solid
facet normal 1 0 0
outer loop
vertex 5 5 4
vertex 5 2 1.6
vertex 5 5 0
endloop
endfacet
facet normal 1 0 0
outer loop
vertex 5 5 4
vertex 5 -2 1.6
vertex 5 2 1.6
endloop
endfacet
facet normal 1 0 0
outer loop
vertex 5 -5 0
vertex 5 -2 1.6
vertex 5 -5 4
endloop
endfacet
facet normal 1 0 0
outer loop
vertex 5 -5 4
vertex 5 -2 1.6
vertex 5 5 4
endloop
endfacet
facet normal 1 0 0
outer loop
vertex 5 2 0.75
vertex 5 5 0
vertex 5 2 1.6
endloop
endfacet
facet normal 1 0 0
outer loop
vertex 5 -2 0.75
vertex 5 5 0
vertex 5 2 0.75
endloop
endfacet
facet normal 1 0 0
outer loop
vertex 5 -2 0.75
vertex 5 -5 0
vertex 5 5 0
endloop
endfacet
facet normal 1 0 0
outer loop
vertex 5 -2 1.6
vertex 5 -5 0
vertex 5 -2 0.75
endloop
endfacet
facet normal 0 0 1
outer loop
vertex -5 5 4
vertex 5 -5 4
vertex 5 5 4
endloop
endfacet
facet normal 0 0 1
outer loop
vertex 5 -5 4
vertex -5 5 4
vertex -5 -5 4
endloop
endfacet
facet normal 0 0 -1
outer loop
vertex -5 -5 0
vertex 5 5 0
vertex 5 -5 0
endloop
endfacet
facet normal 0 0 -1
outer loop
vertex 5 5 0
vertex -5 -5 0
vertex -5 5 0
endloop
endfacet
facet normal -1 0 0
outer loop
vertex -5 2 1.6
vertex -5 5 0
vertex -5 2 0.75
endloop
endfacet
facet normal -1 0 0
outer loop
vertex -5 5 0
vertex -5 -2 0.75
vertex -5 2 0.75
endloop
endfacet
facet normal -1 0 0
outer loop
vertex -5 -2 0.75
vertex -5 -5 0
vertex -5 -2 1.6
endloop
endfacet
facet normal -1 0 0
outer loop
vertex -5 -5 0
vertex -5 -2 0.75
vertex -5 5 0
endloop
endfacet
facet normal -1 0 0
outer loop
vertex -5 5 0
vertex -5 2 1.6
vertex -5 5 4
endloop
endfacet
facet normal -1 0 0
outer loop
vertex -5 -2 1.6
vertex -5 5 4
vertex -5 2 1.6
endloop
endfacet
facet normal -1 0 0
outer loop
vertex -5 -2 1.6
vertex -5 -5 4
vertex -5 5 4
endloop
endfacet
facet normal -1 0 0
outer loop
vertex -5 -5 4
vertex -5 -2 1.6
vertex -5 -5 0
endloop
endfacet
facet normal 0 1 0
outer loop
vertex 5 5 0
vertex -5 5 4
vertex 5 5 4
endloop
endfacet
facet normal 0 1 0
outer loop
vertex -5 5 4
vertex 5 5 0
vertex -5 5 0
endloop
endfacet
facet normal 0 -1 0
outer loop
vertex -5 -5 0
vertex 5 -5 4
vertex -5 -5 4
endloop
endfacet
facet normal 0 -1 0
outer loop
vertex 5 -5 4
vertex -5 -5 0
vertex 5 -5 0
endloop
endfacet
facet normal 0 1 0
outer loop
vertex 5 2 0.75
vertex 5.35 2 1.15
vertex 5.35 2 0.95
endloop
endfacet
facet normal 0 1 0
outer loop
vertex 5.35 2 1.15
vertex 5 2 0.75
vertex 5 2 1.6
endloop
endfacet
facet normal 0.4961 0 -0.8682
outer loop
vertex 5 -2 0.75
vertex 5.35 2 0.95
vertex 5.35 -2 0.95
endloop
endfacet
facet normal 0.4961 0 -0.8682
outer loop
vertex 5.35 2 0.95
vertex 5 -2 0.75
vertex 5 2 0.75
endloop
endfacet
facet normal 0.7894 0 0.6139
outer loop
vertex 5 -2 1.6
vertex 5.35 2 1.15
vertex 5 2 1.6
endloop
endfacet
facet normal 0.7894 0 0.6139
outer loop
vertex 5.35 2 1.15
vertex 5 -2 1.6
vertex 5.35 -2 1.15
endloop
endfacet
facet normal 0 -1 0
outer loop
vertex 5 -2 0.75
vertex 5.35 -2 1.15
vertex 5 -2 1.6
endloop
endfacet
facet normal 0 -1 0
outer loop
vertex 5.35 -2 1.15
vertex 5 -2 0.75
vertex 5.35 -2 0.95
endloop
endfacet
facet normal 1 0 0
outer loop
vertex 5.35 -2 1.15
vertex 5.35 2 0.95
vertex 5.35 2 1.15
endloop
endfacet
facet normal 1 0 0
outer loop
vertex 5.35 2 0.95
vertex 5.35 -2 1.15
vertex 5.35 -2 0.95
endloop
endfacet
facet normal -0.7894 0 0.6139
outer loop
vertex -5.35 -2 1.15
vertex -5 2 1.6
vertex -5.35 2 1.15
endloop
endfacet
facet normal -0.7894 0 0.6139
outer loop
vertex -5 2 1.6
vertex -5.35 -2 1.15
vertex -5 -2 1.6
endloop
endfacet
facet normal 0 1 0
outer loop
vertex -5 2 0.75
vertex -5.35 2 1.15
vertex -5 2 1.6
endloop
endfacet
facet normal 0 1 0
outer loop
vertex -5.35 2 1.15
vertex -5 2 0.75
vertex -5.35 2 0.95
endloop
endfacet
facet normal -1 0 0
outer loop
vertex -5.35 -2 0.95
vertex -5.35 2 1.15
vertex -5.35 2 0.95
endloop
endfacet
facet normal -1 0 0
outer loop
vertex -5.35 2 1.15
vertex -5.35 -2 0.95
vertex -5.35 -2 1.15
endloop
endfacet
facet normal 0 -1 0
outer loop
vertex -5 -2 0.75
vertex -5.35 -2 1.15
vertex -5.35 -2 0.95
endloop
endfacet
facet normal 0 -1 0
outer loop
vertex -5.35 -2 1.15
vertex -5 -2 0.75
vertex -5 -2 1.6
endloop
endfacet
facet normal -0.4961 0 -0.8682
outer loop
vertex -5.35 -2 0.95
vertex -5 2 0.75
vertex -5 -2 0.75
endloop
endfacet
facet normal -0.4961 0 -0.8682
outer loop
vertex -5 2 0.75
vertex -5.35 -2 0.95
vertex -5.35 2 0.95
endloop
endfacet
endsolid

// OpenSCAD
// file: ../lib/at01_inverted_core_snap.scad
// File: at01_inverted_core_snap.scad
// AT-01 — experiment-owned inverted fixed-core / removable-shell snap.
//
// This geometry does not copy the QuackWorks/OpenGrid snap. It keeps only the
// high-level design lessons: compact fixed side, removable compliant side,
// explicit locating/retention roles, and a Lite-like 4.0 / 3.4 mm Z baseline.

// Fixed-side baseline.
AT01_CORE_SIZE = 10.0;
AT01_CORE_HEIGHT = 4.0;
AT01_ROOT_SHOULDER = 0.6;
AT01_ENGAGEMENT_HEIGHT = 3.4;

// Removable shell.
AT01_CLEARANCE = 0.20;              // per side on nominal 10 x 10 core
AT01_SHELL_WALL = 1.20;
AT01_SHELL_TOP = 1.20;
AT01_SHELL_INNER = AT01_CORE_SIZE + 2 * AT01_CLEARANCE;
AT01_SHELL_OUTER = AT01_SHELL_INNER + 2 * AT01_SHELL_WALL;
AT01_SHELL_HEIGHT = AT01_ENGAGEMENT_HEIGHT + AT01_SHELL_TOP;

// Two-sided retention on +/-X.
AT01_RIB_PROTRUSION = 0.35;
AT01_RIB_WIDTH = 4.0;
AT01_RIB_Z_BOTTOM = 0.75;
AT01_RIB_Z_LOWER_MAX = 0.95;
AT01_RIB_Z_UPPER_MAX = 1.15;
AT01_RIB_Z_TOP = 1.60;

// Receiving window in each compliant shell tongue.
// Values are shell-local; assembled shell starts at Z=AT01_ROOT_SHOULDER.
AT01_WINDOW_WIDTH = 4.8;
AT01_WINDOW_Z_MIN = 0.05;
AT01_WINDOW_Z_MAX = 1.10;

// Two relief slots isolate the center tongue on each +/-X wall.
AT01_FLEX_SLOT_Y = 3.0;
AT01_FLEX_SLOT_WIDTH = 0.8;

// Evidence helpers.
AT01_EXPLODED_Z = 8.0;
AT01_PROFILE_SLICE = 1.0;

assert(
    abs(AT01_ROOT_SHOULDER + AT01_ENGAGEMENT_HEIGHT - AT01_CORE_HEIGHT) < 0.0001,
    "AT-01 Lite baseline must satisfy shoulder + engagement = 4.0 mm."
);
assert(
    abs(AT01_SHELL_INNER - (AT01_CORE_SIZE + 2 * AT01_CLEARANCE)) < 0.0001,
    "AT-01 shell inner size must preserve the stated side clearance."
);

module _at01_positive_x_retention_rib() {
    // Polygon is defined in X/Z and extruded along Y.
    rotate([90, 0, 0])
        linear_extrude(height = AT01_RIB_WIDTH, center = true, convexity = 10)
            polygon(points = [
                [AT01_CORE_SIZE / 2, AT01_RIB_Z_BOTTOM],
                [AT01_CORE_SIZE / 2 + AT01_RIB_PROTRUSION, AT01_RIB_Z_LOWER_MAX],
                [AT01_CORE_SIZE / 2 + AT01_RIB_PROTRUSION, AT01_RIB_Z_UPPER_MAX],
                [AT01_CORE_SIZE / 2, AT01_RIB_Z_TOP]
            ]);
}

module at01_fixed_core() {
    union() {
        translate([-AT01_CORE_SIZE / 2, -AT01_CORE_SIZE / 2, 0])
            cube([AT01_CORE_SIZE, AT01_CORE_SIZE, AT01_CORE_HEIGHT]);

        _at01_positive_x_retention_rib();

        mirror([1, 0, 0])
            _at01_positive_x_retention_rib();
    }
}

module _at01_shell_outer() {
    translate([-AT01_SHELL_OUTER / 2, -AT01_SHELL_OUTER / 2, 0])
        cube([AT01_SHELL_OUTER, AT01_SHELL_OUTER, AT01_SHELL_HEIGHT]);
}

module _at01_shell_cavity() {
    // Ends exactly at the underside of the top plate.
    translate([-AT01_SHELL_INNER / 2, -AT01_SHELL_INNER / 2, -0.05])
        cube([AT01_SHELL_INNER, AT01_SHELL_INNER, AT01_ENGAGEMENT_HEIGHT + 0.05]);
}

module _at01_retention_window(x_sign = 1) {
    wall_center = (AT01_SHELL_INNER / 2 + AT01_SHELL_OUTER / 2) / 2;
    translate([
        x_sign * wall_center,
        0,
        (AT01_WINDOW_Z_MIN + AT01_WINDOW_Z_MAX) / 2
    ])
        cube([
            AT01_SHELL_WALL + 0.4,
            AT01_WINDOW_WIDTH,
            AT01_WINDOW_Z_MAX - AT01_WINDOW_Z_MIN
        ], center = true);
}

module _at01_flex_slot(x_sign = 1, y_sign = 1) {
    wall_center = (AT01_SHELL_INNER / 2 + AT01_SHELL_OUTER / 2) / 2;
    translate([
        x_sign * wall_center,
        y_sign * AT01_FLEX_SLOT_Y,
        AT01_ENGAGEMENT_HEIGHT / 2
    ])
        cube([
            AT01_SHELL_WALL + 0.4,
            AT01_FLEX_SLOT_WIDTH,
            AT01_ENGAGEMENT_HEIGHT + 0.10
        ], center = true);
}

module at01_removable_shell() {
    difference() {
        _at01_shell_outer();
        _at01_shell_cavity();

        for (x_sign = [-1, 1]) {
            _at01_retention_window(x_sign);

            for (y_sign = [-1, 1])
                _at01_flex_slot(x_sign, y_sign);
        }
    }
}

module at01_assembled(shell_alpha = 0.55) {
    color([0.68, 0.70, 0.74])
        at01_fixed_core();

    translate([0, 0, AT01_ROOT_SHOULDER])
        color([0.92, 0.30, 0.12, shell_alpha])
            at01_removable_shell();
}

module at01_exploded() {
    color([0.68, 0.70, 0.74])
        at01_fixed_core();

    translate([0, 0, AT01_ROOT_SHOULDER + AT01_EXPLODED_Z])
        color([0.92, 0.30, 0.12])
            at01_removable_shell();
}

module _at01_retention_slice_volume() {
    translate([-20, -AT01_PROFILE_SLICE / 2, -1])
        cube([40, AT01_PROFILE_SLICE, 12]);
}

module _at01_locating_slice_volume() {
    translate([-AT01_PROFILE_SLICE / 2, -20, -1])
        cube([AT01_PROFILE_SLICE, 40, 12]);
}

module at01_fixed_retention_profile() {
    intersection() {
        at01_fixed_core();
        _at01_retention_slice_volume();
    }
}

module at01_shell_retention_profile() {
    intersection() {
        at01_removable_shell();
        translate([0, 0, -AT01_ROOT_SHOULDER])
            _at01_retention_slice_volume();
    }
}

module at01_fixed_locating_profile() {
    intersection() {
        at01_fixed_core();
        _at01_locating_slice_volume();
    }
}

module at01_shell_locating_profile() {
    intersection() {
        at01_removable_shell();
        translate([0, 0, -AT01_ROOT_SHOULDER])
            _at01_locating_slice_volume();
    }
}

module at01_retention_section() {
    color([0.68, 0.70, 0.74])
        at01_fixed_retention_profile();

    translate([0, 0, AT01_ROOT_SHOULDER])
        color([0.92, 0.30, 0.12])
            at01_shell_retention_profile();
}

module at01_locating_section() {
    color([0.68, 0.70, 0.74])
        at01_fixed_locating_profile();

    translate([0, 0, AT01_ROOT_SHOULDER])
        color([0.92, 0.30, 0.12])
            at01_shell_locating_profile();
}
// main file
include <../lib/at01_inverted_core_snap.scad>
at01_fixed_core();
